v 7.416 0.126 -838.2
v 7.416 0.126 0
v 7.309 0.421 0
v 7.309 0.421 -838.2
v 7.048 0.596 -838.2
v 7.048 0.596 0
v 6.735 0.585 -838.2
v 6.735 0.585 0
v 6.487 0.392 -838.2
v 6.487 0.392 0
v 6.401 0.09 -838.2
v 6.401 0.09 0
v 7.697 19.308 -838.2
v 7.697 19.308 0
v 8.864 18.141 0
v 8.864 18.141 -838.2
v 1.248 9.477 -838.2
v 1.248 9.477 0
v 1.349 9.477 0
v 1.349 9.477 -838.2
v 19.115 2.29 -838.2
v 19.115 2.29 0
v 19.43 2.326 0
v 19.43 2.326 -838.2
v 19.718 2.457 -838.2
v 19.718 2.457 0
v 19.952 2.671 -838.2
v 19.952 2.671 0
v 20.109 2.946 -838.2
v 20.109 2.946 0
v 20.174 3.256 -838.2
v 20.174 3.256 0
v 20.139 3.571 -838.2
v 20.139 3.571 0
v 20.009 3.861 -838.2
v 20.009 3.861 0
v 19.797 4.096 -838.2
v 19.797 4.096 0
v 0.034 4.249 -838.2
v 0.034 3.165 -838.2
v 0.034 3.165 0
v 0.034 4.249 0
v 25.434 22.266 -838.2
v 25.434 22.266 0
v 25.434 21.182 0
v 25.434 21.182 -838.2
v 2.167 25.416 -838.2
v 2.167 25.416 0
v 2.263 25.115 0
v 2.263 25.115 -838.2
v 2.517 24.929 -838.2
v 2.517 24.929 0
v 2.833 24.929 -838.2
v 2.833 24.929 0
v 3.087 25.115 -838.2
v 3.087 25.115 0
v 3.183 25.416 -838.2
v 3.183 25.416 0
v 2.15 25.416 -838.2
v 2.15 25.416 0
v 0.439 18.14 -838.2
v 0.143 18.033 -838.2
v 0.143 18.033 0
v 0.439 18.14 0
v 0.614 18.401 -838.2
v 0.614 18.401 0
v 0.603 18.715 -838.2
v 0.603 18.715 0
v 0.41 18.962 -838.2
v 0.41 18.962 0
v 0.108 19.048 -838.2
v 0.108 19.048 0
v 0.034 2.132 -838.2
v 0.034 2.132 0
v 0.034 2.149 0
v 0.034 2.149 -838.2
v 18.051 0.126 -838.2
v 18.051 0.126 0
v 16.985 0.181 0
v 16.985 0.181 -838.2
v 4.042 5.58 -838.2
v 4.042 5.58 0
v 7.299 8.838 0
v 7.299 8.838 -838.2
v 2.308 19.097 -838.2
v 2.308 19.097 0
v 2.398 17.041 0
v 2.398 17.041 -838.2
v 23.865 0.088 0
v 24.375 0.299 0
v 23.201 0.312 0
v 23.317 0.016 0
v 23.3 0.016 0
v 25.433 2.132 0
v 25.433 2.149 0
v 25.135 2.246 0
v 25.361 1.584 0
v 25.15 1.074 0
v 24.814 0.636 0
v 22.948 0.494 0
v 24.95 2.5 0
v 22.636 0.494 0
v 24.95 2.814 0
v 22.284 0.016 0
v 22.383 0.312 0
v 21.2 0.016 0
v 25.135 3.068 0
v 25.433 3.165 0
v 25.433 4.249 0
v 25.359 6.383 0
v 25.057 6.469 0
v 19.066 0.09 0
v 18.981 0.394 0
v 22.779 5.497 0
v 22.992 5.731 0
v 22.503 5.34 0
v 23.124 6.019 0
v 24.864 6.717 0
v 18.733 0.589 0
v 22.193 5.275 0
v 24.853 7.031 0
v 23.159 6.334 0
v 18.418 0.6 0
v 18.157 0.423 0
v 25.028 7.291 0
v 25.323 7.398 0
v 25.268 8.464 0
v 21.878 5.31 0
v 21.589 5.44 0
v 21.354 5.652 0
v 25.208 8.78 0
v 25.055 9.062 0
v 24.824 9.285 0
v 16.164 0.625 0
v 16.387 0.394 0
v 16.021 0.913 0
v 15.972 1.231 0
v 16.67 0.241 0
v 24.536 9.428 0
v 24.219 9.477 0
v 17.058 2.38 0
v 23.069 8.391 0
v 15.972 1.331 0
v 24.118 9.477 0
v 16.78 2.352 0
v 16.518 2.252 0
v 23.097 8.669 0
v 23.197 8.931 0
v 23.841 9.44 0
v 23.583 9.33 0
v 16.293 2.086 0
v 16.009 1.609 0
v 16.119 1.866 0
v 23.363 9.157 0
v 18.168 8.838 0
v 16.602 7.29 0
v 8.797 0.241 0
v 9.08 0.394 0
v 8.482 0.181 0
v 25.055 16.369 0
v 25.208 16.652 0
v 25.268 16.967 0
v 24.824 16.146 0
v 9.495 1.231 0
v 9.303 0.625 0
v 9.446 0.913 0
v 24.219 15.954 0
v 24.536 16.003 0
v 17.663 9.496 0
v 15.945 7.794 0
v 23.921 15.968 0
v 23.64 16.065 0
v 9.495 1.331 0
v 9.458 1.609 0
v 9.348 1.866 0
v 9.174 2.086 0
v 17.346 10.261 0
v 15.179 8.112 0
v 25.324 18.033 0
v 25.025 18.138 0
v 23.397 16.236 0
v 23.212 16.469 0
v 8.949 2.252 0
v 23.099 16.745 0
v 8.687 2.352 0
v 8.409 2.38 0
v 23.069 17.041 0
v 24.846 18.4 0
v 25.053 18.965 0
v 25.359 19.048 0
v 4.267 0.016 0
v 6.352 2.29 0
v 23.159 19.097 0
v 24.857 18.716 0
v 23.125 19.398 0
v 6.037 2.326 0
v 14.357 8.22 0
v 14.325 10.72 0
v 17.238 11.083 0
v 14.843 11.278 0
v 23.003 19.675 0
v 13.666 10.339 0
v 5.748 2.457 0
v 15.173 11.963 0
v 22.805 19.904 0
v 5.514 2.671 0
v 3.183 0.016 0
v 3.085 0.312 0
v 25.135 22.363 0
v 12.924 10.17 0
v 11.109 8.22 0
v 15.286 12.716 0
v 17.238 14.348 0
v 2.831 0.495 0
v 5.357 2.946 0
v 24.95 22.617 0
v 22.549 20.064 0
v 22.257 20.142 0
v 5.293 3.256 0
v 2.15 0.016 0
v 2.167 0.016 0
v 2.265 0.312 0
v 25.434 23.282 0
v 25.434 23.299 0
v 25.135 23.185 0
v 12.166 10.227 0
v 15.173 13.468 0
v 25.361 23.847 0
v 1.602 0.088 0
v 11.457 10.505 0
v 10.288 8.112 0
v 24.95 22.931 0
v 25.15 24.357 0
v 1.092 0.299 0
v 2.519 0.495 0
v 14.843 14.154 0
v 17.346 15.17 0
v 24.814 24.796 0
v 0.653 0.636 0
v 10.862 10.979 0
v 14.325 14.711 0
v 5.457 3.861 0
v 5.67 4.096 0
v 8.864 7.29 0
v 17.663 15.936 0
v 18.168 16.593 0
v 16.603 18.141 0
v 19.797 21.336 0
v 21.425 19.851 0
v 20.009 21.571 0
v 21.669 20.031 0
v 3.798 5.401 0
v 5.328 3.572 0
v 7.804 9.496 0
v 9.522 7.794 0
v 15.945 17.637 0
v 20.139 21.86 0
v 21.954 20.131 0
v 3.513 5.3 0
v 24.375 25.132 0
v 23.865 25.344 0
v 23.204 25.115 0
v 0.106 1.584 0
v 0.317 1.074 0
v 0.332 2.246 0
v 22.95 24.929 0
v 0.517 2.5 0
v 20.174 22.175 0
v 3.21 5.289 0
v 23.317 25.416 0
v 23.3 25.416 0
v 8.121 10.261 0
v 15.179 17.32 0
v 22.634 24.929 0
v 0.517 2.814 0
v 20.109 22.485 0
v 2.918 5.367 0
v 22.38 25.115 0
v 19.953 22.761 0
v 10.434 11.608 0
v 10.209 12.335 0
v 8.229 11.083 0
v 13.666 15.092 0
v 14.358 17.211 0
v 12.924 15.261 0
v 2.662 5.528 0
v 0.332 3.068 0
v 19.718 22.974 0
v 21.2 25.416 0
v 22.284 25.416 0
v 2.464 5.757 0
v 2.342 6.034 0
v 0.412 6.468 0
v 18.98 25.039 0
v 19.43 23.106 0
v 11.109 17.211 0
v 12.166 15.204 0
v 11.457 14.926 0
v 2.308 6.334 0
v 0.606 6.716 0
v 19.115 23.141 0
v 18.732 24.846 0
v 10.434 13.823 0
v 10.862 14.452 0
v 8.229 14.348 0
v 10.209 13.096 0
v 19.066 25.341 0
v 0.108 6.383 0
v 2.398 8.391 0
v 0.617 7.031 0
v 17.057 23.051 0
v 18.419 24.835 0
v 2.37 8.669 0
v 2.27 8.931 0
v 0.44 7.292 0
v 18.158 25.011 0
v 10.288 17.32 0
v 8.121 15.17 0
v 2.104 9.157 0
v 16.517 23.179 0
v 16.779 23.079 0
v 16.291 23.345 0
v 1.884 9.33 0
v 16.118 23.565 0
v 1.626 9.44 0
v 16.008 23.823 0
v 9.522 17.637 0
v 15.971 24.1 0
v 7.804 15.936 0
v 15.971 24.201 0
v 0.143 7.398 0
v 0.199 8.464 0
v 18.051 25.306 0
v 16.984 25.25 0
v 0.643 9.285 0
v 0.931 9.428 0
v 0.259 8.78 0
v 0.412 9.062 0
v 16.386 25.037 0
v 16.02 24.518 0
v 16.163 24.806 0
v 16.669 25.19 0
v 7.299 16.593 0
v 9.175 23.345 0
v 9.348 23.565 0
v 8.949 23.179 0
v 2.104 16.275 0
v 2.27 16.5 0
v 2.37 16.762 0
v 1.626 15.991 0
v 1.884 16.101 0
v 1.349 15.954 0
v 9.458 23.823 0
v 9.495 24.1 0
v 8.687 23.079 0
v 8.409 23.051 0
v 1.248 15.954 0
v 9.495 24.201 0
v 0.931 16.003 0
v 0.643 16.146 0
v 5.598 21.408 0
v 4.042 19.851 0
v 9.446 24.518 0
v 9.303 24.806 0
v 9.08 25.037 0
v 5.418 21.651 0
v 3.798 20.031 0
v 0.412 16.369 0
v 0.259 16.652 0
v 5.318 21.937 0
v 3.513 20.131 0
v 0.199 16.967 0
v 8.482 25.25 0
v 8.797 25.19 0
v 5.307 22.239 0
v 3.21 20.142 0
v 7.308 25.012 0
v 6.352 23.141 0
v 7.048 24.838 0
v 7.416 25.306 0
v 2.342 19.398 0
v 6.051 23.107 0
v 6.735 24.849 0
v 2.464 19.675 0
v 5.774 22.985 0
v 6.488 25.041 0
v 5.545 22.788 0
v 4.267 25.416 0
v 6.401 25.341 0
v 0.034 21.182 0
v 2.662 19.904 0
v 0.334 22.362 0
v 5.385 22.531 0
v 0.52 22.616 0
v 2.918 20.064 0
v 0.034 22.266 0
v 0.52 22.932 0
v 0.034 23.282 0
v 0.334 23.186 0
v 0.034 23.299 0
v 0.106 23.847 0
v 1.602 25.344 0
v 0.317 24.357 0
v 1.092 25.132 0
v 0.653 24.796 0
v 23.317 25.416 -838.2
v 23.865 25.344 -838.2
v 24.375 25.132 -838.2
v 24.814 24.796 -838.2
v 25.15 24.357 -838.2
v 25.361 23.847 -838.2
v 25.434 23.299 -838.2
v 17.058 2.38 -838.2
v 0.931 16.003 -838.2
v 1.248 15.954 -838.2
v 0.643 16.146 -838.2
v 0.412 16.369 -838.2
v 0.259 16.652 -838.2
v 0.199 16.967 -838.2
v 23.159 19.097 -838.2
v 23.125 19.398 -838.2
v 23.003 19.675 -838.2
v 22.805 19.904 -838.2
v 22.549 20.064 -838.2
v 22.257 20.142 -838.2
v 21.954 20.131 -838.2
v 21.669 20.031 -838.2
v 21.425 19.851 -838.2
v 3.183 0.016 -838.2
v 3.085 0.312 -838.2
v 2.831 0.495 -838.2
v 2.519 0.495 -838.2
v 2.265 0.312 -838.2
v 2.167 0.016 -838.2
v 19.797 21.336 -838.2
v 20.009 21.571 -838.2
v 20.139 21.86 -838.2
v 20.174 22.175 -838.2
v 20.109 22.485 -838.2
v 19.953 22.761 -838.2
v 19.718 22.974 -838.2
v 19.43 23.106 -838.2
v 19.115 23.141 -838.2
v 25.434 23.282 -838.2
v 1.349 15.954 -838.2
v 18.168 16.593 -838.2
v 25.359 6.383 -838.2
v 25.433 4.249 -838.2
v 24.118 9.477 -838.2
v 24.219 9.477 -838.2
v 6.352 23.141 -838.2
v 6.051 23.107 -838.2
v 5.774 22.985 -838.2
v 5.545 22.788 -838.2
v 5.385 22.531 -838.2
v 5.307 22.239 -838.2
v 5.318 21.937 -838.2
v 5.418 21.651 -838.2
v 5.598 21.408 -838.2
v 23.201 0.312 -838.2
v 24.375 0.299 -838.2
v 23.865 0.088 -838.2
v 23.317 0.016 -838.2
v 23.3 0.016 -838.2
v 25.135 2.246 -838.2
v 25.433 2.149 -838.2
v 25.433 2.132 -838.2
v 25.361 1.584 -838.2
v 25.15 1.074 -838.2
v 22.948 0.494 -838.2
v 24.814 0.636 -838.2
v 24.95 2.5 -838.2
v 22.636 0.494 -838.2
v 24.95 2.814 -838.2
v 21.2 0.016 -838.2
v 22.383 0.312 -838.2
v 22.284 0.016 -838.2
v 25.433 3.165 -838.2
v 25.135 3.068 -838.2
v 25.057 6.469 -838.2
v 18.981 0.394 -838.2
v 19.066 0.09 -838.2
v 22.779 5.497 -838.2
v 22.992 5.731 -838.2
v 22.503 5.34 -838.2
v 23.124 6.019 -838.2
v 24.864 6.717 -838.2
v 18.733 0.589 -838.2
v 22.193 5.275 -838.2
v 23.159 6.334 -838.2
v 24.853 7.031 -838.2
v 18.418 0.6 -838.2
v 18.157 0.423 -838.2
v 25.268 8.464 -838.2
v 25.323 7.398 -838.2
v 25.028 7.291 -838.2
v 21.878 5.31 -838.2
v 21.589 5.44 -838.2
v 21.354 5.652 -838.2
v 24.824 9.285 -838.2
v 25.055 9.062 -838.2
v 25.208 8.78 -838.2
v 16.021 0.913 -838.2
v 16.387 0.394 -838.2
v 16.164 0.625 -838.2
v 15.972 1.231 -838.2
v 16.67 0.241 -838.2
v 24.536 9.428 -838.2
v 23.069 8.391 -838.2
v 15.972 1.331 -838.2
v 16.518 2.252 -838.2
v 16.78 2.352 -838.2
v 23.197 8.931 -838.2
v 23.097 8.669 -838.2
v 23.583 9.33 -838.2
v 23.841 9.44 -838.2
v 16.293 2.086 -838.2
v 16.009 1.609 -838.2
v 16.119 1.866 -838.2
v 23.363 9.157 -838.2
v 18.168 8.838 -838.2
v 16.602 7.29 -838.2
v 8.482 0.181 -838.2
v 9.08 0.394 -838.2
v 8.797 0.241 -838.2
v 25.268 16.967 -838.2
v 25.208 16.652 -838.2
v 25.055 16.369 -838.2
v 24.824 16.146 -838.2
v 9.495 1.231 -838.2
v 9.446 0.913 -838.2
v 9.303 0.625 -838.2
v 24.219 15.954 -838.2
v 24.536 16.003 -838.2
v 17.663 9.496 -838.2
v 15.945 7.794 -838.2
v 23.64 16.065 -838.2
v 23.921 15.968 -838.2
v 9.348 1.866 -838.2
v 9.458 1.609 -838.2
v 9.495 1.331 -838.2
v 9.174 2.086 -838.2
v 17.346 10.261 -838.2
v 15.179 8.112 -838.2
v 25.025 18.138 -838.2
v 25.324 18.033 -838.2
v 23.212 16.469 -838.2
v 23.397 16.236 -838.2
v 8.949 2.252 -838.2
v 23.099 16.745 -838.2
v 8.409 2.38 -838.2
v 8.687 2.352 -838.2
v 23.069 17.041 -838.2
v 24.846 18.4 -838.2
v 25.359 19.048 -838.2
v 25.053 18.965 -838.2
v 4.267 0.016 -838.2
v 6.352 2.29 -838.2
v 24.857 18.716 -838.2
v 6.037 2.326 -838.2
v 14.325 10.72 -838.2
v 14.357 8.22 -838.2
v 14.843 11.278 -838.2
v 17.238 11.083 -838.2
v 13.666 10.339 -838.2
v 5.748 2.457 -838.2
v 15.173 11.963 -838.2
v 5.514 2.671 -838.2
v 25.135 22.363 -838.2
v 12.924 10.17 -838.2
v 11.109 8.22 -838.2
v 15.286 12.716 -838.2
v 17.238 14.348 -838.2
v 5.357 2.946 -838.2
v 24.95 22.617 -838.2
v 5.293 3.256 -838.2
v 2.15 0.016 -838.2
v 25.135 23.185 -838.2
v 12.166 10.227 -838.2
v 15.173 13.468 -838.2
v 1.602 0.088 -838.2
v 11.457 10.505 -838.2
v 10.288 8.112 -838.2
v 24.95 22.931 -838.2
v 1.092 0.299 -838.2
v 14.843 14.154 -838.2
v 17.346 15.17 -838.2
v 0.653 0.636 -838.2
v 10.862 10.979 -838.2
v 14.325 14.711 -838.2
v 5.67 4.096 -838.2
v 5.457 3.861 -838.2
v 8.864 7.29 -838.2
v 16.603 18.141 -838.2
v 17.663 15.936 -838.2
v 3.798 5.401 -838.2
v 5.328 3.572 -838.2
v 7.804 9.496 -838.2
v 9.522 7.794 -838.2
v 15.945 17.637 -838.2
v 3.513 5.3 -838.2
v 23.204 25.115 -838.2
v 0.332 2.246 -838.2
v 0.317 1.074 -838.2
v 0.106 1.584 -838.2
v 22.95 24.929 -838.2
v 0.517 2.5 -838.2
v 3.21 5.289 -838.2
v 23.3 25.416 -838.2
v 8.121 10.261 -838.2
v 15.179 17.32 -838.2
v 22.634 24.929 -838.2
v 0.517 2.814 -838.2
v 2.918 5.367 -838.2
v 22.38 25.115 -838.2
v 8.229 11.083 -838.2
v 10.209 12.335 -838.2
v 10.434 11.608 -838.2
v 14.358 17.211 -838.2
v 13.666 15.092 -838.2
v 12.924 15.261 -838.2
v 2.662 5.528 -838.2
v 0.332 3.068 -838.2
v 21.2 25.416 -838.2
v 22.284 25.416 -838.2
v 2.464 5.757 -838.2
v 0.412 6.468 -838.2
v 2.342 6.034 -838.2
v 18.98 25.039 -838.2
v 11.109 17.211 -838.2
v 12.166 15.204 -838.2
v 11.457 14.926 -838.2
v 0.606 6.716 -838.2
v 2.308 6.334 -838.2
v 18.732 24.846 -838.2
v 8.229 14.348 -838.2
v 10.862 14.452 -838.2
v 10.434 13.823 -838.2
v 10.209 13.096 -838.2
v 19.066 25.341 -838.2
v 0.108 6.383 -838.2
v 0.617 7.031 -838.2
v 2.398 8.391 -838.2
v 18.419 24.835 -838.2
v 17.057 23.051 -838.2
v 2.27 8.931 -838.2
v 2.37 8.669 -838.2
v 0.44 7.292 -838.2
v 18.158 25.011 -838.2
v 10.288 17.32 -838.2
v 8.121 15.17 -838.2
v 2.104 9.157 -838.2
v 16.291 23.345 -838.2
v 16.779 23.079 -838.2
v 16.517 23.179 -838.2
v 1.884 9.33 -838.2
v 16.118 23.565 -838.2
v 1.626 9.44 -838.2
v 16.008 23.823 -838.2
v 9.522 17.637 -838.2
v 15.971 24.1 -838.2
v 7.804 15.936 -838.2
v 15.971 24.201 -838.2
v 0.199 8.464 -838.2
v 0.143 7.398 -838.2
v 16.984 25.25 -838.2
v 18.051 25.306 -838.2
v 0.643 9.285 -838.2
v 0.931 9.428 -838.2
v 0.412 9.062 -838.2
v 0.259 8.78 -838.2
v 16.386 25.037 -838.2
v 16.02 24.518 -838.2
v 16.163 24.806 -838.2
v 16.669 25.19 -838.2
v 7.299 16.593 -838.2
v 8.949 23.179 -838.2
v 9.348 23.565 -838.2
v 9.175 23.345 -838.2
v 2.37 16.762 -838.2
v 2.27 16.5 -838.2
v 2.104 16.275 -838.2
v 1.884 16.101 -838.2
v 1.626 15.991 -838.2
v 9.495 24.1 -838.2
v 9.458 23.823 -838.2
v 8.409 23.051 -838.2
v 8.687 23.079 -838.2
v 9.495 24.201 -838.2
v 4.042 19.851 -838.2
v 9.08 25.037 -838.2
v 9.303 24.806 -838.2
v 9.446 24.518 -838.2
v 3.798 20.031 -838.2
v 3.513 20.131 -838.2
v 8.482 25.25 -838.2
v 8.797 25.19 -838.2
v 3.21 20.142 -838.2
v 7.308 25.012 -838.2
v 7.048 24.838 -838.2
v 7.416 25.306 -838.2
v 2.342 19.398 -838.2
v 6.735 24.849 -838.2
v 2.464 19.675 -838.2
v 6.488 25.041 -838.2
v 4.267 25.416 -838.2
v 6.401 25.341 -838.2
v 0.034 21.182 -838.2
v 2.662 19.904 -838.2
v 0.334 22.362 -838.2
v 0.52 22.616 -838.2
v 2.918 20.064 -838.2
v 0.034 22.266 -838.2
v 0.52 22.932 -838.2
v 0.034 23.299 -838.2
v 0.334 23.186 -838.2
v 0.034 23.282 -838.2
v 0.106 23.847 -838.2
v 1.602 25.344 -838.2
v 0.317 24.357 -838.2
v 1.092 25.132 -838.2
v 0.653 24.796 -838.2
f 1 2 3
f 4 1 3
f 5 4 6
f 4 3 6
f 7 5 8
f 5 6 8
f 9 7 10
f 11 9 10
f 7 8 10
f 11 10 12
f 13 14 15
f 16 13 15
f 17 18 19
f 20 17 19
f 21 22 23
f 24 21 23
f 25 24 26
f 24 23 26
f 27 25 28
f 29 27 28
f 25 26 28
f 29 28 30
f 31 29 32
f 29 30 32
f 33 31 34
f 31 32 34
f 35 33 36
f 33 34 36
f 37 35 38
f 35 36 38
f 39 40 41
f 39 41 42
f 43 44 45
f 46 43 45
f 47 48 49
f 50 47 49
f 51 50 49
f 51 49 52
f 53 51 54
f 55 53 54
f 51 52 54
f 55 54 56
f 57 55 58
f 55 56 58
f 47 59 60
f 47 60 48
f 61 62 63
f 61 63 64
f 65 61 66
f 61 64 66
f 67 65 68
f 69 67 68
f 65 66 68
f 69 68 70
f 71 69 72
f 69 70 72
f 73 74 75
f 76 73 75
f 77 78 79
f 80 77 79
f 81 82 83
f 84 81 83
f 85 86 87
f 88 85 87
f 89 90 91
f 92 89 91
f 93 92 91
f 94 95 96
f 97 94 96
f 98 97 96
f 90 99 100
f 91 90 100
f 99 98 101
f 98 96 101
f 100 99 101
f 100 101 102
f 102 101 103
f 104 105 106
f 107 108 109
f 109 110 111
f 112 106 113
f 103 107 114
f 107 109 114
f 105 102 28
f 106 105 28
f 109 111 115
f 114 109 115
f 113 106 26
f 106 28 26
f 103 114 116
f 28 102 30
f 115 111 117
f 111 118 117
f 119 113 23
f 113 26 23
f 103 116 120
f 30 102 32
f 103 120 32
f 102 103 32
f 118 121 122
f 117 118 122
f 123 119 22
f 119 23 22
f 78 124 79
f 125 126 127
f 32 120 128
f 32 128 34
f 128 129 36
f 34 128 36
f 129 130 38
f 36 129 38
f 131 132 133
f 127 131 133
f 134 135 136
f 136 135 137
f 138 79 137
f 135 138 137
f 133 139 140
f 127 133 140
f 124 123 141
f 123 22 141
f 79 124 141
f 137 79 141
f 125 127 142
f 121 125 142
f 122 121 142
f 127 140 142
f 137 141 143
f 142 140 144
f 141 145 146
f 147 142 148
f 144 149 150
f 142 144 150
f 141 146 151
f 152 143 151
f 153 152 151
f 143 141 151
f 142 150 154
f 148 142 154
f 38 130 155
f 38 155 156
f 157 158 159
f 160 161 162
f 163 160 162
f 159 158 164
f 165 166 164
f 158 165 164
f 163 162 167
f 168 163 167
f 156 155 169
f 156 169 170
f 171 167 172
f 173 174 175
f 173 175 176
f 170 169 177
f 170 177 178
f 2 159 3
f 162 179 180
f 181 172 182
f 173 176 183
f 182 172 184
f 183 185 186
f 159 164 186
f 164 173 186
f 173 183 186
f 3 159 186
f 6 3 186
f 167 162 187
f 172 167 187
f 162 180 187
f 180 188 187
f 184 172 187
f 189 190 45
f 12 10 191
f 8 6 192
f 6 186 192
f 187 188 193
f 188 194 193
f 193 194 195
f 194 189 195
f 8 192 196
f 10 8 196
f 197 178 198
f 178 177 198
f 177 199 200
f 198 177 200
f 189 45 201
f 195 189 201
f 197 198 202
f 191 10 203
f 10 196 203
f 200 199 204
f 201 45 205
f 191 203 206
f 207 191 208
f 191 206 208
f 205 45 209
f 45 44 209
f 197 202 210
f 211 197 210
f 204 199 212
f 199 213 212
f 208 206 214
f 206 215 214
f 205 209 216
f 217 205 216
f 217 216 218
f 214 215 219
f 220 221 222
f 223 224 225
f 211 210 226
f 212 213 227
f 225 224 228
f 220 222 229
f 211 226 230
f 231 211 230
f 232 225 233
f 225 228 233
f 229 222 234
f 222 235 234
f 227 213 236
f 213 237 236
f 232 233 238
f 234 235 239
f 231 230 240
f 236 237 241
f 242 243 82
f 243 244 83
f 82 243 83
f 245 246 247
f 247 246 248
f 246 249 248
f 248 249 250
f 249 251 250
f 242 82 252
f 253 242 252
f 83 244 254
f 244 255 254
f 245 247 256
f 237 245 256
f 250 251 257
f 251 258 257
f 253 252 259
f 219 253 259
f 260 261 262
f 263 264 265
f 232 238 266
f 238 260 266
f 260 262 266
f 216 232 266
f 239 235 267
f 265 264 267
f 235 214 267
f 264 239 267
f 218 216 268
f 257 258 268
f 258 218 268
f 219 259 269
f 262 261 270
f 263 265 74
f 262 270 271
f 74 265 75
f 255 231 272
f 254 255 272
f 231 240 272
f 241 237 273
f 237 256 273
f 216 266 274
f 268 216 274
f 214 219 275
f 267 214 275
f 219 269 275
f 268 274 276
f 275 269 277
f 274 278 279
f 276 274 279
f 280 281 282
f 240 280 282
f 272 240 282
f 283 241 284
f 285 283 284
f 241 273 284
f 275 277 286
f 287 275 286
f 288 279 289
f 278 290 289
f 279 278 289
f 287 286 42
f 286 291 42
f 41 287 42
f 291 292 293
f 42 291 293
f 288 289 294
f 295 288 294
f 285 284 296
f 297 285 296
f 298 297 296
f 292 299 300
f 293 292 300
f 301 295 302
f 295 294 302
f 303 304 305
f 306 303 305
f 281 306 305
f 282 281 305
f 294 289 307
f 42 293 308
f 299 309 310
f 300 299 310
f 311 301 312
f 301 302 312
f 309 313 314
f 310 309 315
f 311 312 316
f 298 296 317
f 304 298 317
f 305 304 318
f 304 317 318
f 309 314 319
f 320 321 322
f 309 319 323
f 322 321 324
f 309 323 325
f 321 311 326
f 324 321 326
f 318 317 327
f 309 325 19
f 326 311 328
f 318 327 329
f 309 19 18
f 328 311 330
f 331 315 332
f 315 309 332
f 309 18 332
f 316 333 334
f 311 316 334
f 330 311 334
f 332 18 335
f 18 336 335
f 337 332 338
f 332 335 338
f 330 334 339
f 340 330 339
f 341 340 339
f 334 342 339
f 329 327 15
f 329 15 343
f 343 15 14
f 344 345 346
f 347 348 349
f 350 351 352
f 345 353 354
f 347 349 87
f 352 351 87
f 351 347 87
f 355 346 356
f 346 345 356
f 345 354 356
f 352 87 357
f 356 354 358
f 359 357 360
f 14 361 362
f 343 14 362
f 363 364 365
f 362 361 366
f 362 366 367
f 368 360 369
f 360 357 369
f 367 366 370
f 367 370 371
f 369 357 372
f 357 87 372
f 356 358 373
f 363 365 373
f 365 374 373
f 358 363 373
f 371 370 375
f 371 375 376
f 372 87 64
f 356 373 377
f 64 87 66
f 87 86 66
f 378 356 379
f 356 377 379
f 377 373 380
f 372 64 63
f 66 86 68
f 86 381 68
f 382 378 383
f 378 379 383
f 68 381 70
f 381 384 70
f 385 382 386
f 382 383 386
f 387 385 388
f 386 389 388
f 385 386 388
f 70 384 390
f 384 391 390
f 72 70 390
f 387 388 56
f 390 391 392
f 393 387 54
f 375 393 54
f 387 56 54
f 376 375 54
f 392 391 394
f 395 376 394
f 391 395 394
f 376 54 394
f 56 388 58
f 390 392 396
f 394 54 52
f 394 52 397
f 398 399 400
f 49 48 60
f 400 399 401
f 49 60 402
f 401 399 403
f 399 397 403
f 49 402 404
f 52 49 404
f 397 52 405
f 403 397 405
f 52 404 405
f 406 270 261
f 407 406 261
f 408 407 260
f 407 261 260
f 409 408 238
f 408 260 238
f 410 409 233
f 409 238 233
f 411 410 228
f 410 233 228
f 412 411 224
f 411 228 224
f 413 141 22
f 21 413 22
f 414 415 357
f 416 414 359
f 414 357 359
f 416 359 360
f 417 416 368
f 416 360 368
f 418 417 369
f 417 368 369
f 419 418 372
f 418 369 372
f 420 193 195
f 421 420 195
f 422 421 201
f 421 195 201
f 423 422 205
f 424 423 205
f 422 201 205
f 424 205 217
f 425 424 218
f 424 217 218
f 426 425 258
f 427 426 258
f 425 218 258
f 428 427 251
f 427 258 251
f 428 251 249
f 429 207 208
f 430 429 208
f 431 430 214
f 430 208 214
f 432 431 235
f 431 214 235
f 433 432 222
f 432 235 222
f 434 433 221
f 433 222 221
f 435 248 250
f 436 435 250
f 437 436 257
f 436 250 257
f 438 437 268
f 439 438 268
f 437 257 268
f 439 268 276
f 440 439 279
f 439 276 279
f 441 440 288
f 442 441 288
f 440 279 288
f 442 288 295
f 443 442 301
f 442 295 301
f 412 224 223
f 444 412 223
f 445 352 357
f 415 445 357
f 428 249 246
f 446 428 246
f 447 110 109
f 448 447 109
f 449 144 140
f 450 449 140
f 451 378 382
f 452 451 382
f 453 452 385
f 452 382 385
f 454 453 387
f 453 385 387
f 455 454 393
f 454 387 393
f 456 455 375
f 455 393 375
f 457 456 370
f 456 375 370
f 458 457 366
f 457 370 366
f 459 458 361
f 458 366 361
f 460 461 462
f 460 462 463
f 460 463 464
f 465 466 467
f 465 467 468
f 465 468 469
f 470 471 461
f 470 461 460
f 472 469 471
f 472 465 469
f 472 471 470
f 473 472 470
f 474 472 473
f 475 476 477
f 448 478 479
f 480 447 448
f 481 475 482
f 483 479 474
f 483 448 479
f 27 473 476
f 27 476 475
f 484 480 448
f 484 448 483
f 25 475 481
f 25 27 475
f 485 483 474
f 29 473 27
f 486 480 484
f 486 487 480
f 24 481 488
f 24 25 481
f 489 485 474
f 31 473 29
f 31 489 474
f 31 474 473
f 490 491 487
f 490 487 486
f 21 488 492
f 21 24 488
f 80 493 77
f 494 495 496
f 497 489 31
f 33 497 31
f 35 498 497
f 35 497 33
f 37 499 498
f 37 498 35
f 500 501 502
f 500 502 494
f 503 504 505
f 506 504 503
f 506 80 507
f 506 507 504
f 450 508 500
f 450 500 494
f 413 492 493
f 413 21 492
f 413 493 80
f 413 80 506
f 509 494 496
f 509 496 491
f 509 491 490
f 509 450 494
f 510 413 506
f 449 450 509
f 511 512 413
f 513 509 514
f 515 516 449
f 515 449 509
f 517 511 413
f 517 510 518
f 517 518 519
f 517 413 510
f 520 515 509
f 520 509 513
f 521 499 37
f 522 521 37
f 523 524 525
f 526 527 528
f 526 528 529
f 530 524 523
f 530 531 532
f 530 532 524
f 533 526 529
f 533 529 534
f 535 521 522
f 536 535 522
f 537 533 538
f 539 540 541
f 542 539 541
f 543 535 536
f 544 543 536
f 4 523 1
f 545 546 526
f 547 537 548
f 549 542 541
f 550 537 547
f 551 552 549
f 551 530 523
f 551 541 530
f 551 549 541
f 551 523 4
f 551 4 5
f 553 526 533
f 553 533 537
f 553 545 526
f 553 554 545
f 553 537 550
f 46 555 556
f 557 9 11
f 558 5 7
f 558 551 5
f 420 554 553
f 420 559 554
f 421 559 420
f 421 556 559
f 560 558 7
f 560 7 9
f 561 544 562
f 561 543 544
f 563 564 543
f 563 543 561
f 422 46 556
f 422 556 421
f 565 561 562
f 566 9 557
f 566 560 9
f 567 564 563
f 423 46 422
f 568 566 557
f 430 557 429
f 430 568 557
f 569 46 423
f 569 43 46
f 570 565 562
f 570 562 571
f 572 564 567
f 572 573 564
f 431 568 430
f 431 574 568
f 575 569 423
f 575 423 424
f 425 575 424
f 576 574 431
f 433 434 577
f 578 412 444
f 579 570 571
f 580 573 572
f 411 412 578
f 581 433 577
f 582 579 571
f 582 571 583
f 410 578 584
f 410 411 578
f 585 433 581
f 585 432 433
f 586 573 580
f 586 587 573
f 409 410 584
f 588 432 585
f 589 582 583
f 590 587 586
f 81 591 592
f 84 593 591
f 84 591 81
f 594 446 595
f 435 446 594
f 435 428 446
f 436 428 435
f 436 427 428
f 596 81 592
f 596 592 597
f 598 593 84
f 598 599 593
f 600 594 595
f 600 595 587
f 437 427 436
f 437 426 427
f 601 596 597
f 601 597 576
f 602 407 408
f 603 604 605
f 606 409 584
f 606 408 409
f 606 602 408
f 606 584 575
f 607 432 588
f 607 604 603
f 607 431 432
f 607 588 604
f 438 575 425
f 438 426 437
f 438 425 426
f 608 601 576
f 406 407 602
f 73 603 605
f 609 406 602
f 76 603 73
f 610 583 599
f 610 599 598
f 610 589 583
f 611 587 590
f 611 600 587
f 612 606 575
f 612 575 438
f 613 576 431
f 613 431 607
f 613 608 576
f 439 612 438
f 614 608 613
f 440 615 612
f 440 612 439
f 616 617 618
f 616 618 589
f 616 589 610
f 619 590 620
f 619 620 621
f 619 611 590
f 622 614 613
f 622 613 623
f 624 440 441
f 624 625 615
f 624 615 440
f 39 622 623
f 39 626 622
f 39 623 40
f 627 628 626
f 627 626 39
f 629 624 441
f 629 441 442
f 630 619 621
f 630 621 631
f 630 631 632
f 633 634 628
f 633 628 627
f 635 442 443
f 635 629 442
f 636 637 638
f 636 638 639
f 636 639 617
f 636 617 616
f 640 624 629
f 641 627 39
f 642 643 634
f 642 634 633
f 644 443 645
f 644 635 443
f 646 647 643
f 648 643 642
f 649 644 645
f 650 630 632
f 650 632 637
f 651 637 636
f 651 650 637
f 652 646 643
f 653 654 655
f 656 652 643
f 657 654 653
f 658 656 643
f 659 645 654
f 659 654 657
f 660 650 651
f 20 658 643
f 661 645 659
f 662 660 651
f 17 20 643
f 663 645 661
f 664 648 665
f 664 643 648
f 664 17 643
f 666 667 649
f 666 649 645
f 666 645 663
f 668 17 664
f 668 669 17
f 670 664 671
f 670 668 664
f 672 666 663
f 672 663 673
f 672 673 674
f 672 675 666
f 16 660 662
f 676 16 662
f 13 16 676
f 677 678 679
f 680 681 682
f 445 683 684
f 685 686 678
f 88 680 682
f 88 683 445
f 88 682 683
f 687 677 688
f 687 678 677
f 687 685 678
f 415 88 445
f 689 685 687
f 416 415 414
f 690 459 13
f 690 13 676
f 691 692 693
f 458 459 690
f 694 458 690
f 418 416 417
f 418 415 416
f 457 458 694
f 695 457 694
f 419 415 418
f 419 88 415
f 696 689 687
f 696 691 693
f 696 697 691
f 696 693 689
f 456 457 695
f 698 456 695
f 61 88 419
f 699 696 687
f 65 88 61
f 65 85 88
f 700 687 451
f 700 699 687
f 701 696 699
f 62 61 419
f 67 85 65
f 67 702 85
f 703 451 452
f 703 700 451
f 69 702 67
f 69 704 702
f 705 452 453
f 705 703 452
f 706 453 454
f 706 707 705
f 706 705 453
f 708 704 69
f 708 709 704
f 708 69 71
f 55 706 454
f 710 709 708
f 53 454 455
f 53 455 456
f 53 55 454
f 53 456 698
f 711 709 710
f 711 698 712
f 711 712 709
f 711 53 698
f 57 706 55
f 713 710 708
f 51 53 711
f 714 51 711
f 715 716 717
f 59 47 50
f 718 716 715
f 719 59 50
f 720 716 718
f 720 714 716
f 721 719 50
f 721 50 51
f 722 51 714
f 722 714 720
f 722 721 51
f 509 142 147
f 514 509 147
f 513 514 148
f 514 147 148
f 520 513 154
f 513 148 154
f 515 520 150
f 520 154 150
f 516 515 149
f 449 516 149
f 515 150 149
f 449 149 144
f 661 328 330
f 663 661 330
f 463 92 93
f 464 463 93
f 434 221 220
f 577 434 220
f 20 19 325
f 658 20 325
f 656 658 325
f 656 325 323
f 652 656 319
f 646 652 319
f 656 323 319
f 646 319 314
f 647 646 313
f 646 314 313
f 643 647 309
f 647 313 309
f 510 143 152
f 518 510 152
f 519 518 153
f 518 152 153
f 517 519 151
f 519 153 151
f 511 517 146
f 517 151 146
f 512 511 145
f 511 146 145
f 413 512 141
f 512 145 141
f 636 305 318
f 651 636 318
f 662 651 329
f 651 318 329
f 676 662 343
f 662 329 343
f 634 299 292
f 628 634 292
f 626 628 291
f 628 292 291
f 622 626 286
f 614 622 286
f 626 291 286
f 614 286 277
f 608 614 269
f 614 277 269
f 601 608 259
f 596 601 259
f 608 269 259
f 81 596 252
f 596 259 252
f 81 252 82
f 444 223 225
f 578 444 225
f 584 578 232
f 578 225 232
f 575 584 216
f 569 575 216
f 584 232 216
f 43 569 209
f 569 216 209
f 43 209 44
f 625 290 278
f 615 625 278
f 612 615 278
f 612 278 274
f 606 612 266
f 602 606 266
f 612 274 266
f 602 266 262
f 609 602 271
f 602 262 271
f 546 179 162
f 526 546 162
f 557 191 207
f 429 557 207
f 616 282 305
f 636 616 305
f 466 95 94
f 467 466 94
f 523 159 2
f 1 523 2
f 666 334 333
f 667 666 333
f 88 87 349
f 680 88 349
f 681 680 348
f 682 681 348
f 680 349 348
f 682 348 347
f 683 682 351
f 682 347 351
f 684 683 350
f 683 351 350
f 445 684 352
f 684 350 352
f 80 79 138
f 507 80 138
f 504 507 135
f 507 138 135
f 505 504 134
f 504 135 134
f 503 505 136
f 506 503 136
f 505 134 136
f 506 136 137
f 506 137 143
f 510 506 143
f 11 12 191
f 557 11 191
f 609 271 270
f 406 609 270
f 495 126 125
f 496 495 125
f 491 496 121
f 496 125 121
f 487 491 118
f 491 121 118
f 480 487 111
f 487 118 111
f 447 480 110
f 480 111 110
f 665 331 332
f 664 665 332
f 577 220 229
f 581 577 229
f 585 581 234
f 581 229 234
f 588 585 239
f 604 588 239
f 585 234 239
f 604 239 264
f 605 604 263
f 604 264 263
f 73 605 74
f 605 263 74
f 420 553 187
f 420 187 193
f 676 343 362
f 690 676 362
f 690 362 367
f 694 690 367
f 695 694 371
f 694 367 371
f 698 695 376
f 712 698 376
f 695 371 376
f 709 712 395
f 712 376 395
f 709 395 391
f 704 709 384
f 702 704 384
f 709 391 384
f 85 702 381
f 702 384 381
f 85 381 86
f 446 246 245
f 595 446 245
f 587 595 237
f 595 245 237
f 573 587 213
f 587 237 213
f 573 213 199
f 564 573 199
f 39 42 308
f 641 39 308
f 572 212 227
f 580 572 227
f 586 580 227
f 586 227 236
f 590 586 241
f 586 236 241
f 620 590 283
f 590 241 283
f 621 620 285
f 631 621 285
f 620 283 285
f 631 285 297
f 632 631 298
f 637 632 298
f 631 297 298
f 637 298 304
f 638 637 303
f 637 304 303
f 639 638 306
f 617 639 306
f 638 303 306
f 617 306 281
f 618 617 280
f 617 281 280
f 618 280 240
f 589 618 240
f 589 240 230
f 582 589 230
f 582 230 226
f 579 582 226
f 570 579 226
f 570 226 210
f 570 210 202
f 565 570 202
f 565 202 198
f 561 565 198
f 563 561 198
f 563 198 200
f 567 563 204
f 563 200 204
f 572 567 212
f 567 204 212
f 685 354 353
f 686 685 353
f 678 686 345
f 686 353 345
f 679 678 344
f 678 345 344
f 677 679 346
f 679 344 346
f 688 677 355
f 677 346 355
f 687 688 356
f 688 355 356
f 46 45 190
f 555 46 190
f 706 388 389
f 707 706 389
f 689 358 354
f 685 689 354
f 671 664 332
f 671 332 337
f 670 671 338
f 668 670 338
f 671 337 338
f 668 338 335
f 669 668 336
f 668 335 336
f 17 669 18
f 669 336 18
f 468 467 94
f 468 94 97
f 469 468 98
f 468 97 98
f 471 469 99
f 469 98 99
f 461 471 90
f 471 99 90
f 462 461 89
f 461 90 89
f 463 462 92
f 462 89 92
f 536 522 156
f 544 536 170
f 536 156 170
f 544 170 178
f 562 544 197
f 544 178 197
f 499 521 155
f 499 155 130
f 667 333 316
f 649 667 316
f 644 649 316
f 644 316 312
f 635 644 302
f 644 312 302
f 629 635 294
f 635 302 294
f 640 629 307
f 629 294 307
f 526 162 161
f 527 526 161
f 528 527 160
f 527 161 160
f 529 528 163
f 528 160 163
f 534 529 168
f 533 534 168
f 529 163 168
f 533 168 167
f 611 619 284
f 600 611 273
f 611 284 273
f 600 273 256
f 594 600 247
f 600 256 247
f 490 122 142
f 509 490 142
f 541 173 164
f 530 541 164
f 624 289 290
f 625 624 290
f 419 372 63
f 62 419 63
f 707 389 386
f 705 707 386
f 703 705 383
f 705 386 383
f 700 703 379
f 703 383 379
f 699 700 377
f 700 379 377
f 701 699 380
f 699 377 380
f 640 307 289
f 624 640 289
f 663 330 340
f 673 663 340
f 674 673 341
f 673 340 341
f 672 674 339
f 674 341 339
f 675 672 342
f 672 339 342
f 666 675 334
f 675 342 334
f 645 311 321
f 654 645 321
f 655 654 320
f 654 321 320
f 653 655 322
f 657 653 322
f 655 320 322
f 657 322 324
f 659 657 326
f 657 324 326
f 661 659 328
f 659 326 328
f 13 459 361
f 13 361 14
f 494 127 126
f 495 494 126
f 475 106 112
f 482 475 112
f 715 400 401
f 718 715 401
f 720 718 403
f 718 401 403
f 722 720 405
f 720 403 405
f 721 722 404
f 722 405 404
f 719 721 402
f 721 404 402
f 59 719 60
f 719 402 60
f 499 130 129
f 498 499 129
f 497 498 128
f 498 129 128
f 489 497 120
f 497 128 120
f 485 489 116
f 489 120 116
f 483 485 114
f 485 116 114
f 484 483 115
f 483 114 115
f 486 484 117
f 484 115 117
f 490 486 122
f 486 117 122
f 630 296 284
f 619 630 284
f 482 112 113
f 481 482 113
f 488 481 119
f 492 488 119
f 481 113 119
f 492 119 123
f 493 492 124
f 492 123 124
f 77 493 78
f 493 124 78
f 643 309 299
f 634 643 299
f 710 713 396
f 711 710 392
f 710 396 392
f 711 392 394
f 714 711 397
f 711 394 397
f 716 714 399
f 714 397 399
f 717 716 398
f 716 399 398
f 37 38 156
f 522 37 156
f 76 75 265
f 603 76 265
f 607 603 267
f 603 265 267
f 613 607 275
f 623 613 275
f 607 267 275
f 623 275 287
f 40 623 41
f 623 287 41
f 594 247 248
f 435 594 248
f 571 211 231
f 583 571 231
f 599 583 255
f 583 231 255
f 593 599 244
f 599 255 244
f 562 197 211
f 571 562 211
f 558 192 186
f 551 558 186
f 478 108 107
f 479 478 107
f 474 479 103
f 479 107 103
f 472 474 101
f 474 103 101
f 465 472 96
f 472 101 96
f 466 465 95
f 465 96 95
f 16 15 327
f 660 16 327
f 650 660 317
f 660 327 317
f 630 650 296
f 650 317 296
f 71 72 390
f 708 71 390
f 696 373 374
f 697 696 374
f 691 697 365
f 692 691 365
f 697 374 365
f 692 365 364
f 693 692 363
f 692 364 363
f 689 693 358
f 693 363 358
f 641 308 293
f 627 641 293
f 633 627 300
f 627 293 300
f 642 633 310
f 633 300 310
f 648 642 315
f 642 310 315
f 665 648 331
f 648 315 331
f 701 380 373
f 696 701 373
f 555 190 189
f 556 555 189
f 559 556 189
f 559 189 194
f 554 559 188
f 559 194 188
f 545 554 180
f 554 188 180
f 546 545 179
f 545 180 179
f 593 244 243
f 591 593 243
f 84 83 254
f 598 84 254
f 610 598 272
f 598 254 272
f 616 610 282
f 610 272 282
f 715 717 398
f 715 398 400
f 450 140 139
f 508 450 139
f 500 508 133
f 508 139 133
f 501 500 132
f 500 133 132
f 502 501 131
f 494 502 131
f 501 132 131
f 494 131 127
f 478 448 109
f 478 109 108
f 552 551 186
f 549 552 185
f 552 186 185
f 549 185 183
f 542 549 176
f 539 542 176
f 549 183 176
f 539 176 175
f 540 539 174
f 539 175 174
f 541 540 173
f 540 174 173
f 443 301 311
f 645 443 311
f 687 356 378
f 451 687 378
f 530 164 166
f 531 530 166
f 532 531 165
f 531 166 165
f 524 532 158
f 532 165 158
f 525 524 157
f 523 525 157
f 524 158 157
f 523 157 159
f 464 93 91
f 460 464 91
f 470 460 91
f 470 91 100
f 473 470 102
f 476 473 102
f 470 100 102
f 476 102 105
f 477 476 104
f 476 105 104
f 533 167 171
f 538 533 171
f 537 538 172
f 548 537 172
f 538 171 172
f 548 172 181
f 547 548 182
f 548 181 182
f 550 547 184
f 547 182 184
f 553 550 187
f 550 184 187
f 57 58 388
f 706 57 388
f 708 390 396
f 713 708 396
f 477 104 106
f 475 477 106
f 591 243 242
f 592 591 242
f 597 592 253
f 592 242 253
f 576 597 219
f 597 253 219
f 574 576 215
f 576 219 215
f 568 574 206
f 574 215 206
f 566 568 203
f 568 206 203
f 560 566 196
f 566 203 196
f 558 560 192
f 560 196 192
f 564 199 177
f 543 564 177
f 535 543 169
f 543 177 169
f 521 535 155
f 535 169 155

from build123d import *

# Parameters (mm, degrees)
SKETCH1_R      = 2.5527
EXTRUDE1_DEPTH = 838.2


with BuildPart() as part:
    # Sketch1 → Extrude1 (new body)
    with BuildSketch(Plane.XY):
        with BuildLine():
            Line((25.433443131, 2.149221002), (25.433433122, 2.132304602))
            ThreePointArc((25.433433122, 2.132304602), (24.81352977, 0.635652711), (23.316920529, 0.0156464))
            Line((23.316920529, 0.0156464), (23.300004129, 0.015621))
            ThreePointArc((23.300004129, 0.015621), (22.791978729, 0.518591735), (22.283953329, 0.015621))
            Line((22.283953329, 0.015621), (21.200262329, 0.015621))
            Line((21.200262329, 0.015621), (19.066357529, 0.0901446))
            ThreePointArc((19.066357529, 0.0901446), (18.57651791, 0.619499034), (18.050946389, 0.125602744))
            Line((18.050946389, 0.125602744), (16.985183129, 0.1812798))
            ThreePointArc((16.985183129, 0.1812798), (16.266656931, 0.501228728), (15.972027929, 1.230503))
            Line((15.972027929, 1.230503), (15.972002529, 1.330908925))
            ThreePointArc((15.972002529, 1.330908925), (16.292567692, 2.086113746), (17.058499831, 2.380127869))
            Line((17.058499831, 2.380127869), (19.115070367, 2.28984489))
            ThreePointArc((19.115070367, 2.28984489), (20.109237927, 2.946078438), (19.79674691, 4.095583101))
            Line((19.79674691, 4.095583101), (16.602495326, 7.289892083))
            ThreePointArc((16.602495326, 7.289892083), (15.5724442, 7.978160281), (14.357411125, 8.219848224))
            Line((14.357411125, 8.219848224), (12.733578665, 8.219848224))
            Line((12.733578665, 8.219848224), (11.109350265, 8.219848224))
            ThreePointArc((11.109350265, 8.219848224), (9.894326313, 7.97816406), (8.864280029, 7.289906048))
            Line((8.864280029, 7.289906048), (5.670118065, 4.095726424))
            ThreePointArc((5.670118065, 4.095726424), (5.357454926, 2.946), (6.351985959, 2.289846732))
            Line((6.351985959, 2.289846732), (8.408555268, 2.380129669))
            ThreePointArc((8.408555268, 2.380129669), (9.174487549, 2.086116104), (9.495053265, 1.330911592))
            Line((9.495053265, 1.330911592), (9.495078665, 1.230505007))
            ThreePointArc((9.495078665, 1.230505007), (9.200425317, 0.501212103), (8.481859988, 0.181286169))
            Line((8.481859988, 0.181286169), (7.416109406, 0.125604568))
            ThreePointArc((7.416109406, 0.125604568), (6.890689076, 0.615566134), (6.400728384, 0.090144989))
            Line((6.400728384, 0.090144989), (4.266844329, 0.015621))
            Line((4.266844329, 0.015621), (3.183051729, 0.015621))
            ThreePointArc((3.183051729, 0.015621), (2.675064429, 0.52002892), (2.167077129, 0.015621))
            Line((2.167077129, 0.015621), (2.150186129, 0.015621))
            ThreePointArc((2.150186129, 0.015621), (0.653473782, 0.635584814), (0.033527929, 2.1323046))
            Line((0.033527929, 2.1323046), (0.033502529, 2.149221))
            ThreePointArc((0.033502529, 2.149221), (0.541502529, 2.657221), (0.033502529, 3.165221))
            Line((0.033502529, 3.165221), (0.033502529, 4.2489628))
            Line((0.033502529, 4.2489628), (0.108051389, 6.382893005))
            ThreePointArc((0.108051389, 6.382893005), (0.636769546, 6.872740923), (0.143484067, 7.398253347))
            Line((0.143484067, 7.398253347), (0.199186453, 8.463965811))
            ThreePointArc((0.199186453, 8.463965811), (0.519108205, 9.182539461), (1.248405666, 9.47719728))
            Line((1.248405666, 9.47719728), (1.348815787, 9.477273486))
            ThreePointArc((1.348815787, 9.477273486), (2.104048619, 9.15668186), (2.398034533, 8.3907002))
            Line((2.398034533, 8.3907002), (2.307726292, 6.334129777))
            ThreePointArc((2.307726292, 6.334129777), (2.917959272, 5.36690304), (4.041530045, 5.580211665))
            Line((4.041530045, 5.580211665), (7.299319478, 8.838034664))
            ThreePointArc((7.299319478, 8.838034664), (7.987564527, 9.868074786), (8.229243882, 11.083087128))
            Line((8.229243882, 11.083087128), (8.229243882, 12.715595928))
            Line((8.229243882, 12.715595928), (8.229243882, 14.348182637))
            ThreePointArc((8.229243882, 14.348182637), (7.987566856, 15.563189358), (7.299328083, 16.593226497))
            Line((7.299328083, 16.593226497), (4.041535389, 19.85107773))
            ThreePointArc((4.041535389, 19.85107773), (2.917975571, 20.06439507), (2.307727974, 19.09718836))
            Line((2.307727974, 19.09718836), (2.398036312, 17.040593596))
            ThreePointArc((2.398036312, 17.040593596), (2.10402253, 16.274661146), (1.348817665, 15.954095654))
            Line((1.348817665, 15.954095654), (1.248411465, 15.954095654))
            ThreePointArc((1.248411465, 15.954095654), (0.519124814, 16.248743141), (0.199193406, 16.967297282))
            Line((0.199193406, 16.967297282), (0.14348581, 18.033064914))
            ThreePointArc((0.14348581, 18.033064914), (0.63344738, 18.558485131), (0.108026456, 19.048445943))
            Line((0.108026456, 19.048445943), (0.033502529, 21.1823554))
            Line((0.033502529, 21.1823554), (0.033502529, 22.2660972))
            ThreePointArc((0.033502529, 22.2660972), (0.545094609, 22.7740845), (0.033502529, 23.2820718))
            Line((0.033502529, 23.2820718), (0.033502529, 23.298997075))
            ThreePointArc((0.033502529, 23.298997075), (0.653448354, 24.795691433), (2.15013525, 25.415655275))
            Line((2.15013525, 25.415655275), (2.167093654, 25.415629946))
            ThreePointArc((2.167093654, 25.415629946), (2.675083099, 24.904039996), (3.183068254, 25.415634206))
            Line((3.183068254, 25.415634206), (4.266835454, 25.415634206))
            Line((4.266835454, 25.415634206), (6.400740254, 25.341136006))
            ThreePointArc((6.400740254, 25.341136006), (6.890804215, 24.818958649), (7.416100594, 25.305677862))
            Line((7.416100594, 25.305677862), (8.481838454, 25.250000806))
            ThreePointArc((8.481838454, 25.250000806), (9.200412021, 24.930079072), (9.495069854, 24.200781707))
            Line((9.495069854, 24.200781707), (9.495069854, 24.100371406))
            ThreePointArc((9.495069854, 24.100371406), (9.174504645, 23.345166815), (8.408572699, 23.051152732))
            Line((8.408572699, 23.051152732), (6.352002282, 23.141435707))
            ThreePointArc((6.352002282, 23.141435707), (5.384806579, 22.531184689), (5.598121123, 21.407631959))
            Line((5.598121123, 21.407631959), (7.697410254, 19.308356606))
            Line((7.697410254, 19.308356606), (8.864372763, 18.141401758))
            ThreePointArc((8.864372763, 18.141401758), (9.894414341, 17.453153646), (11.109429425, 17.211473156))
            Line((11.109429425, 17.211473156), (12.733581625, 17.211473156))
            Line((12.733581625, 17.211473156), (14.357534054, 17.211473156))
            ThreePointArc((14.357534054, 17.211473156), (15.572561508, 17.45315877), (16.60260965, 18.141420692))
            Line((16.60260965, 18.141420692), (19.796856475, 21.335700428))
            ThreePointArc((19.796856475, 21.335700428), (20.109338963, 22.485254296), (19.115085927, 23.141440475))
            Line((19.115085927, 23.141440475), (17.057348777, 23.051157558))
            ThreePointArc((17.057348777, 23.051157558), (16.291416105, 23.345171208), (15.970850487, 24.100376193))
            Line((15.970850487, 24.100376193), (15.970850487, 24.200756993))
            ThreePointArc((15.970850487, 24.200756993), (16.265496714, 24.930042339), (16.98404849, 25.249974926))
            Line((16.98404849, 25.249974926), (18.050937347, 25.305682649))
            ThreePointArc((18.050937347, 25.305682649), (18.576354433, 24.815720969), (19.066318594, 25.341135742))
            Line((19.066318594, 25.341135742), (21.200253454, 25.415634206))
            Line((21.200253454, 25.415634206), (22.283969854, 25.415634206))
            ThreePointArc((22.283969854, 25.415634206), (22.791957154, 24.904042126), (23.299944454, 25.415634206))
            Line((23.299944454, 25.415634206), (23.316930297, 25.415634206))
            ThreePointArc((23.316930297, 25.415634206), (24.813629353, 24.795683684), (25.433588497, 23.2989882))
            Line((25.433588497, 23.2989882), (25.433613897, 23.2820718))
            ThreePointArc((25.433613897, 23.2820718), (24.925618902, 22.774071644), (25.43361421, 22.2660718))
            Line((25.43361421, 22.2660718), (25.4336042, 21.1823554))
            Line((25.4336042, 21.1823554), (25.3590552, 19.048476))
            ThreePointArc((25.3590552, 19.048476), (24.826095097, 18.558846649), (25.323514364, 18.033149546))
            Line((25.323514364, 18.033149546), (25.267781506, 16.967386543))
            ThreePointArc((25.267781506, 16.967386543), (24.947855109, 16.248812971), (24.21855381, 15.954159797))
            ThreePointArc((24.21855381, 15.954159797), (23.396859234, 16.236195338), (23.068959156, 17.040687453))
            Line((23.068959156, 17.040687453), (23.159251265, 19.097257735))
            ThreePointArc((23.159251265, 19.097257735), (22.549002581, 20.064456727), (21.425448036, 19.851143506))
            Line((21.425448036, 19.851143506), (18.167765516, 16.593442973))
            ThreePointArc((18.167765516, 16.593442973), (17.479516557, 15.563400992), (17.237835752, 14.348385149))
            Line((17.237835752, 14.348385149), (17.237835752, 12.715636694))
            Line((17.237835752, 12.715636694), (17.237835752, 11.083127894))
            ThreePointArc((17.237835752, 11.083127894), (17.47952023, 9.868103183), (18.16777909, 8.838056496))
            Line((18.16777909, 8.838056496), (21.353523773, 5.652332724))
            ThreePointArc((21.353523773, 5.652332724), (22.503190772, 5.339700837), (23.159374985, 6.334132928))
            Line((23.159374985, 6.334132928), (23.069082951, 8.390722922))
            ThreePointArc((23.069082951, 8.390722922), (23.363090217, 9.15665763), (24.118292102, 9.477229556))
            Line((24.118292102, 9.477229556), (24.218677373, 9.477255408))
            ThreePointArc((24.218677373, 9.477255408), (24.94789253, 9.182528501), (25.267744306, 8.463978895))
            Line((25.267744306, 8.463978895), (25.323466772, 7.398253367))
            ThreePointArc((25.323466772, 7.398253367), (24.833515373, 6.872829664), (25.358933799, 6.382872606))
            Line((25.358933799, 6.382872606), (25.43344779, 4.248962801))
            Line((25.43344779, 4.248962801), (25.43343778, 3.165221001))
            ThreePointArc((25.43343778, 3.165221001), (24.925433088, 2.657218326), (25.433443131, 2.149221002))
        make_face()
        with Locations((12.7335534, 12.7156464)):
            Circle(SKETCH1_R, mode=Mode.SUBTRACT)
    extrude(amount=-EXTRUDE1_DEPTH)


solid = part.part
